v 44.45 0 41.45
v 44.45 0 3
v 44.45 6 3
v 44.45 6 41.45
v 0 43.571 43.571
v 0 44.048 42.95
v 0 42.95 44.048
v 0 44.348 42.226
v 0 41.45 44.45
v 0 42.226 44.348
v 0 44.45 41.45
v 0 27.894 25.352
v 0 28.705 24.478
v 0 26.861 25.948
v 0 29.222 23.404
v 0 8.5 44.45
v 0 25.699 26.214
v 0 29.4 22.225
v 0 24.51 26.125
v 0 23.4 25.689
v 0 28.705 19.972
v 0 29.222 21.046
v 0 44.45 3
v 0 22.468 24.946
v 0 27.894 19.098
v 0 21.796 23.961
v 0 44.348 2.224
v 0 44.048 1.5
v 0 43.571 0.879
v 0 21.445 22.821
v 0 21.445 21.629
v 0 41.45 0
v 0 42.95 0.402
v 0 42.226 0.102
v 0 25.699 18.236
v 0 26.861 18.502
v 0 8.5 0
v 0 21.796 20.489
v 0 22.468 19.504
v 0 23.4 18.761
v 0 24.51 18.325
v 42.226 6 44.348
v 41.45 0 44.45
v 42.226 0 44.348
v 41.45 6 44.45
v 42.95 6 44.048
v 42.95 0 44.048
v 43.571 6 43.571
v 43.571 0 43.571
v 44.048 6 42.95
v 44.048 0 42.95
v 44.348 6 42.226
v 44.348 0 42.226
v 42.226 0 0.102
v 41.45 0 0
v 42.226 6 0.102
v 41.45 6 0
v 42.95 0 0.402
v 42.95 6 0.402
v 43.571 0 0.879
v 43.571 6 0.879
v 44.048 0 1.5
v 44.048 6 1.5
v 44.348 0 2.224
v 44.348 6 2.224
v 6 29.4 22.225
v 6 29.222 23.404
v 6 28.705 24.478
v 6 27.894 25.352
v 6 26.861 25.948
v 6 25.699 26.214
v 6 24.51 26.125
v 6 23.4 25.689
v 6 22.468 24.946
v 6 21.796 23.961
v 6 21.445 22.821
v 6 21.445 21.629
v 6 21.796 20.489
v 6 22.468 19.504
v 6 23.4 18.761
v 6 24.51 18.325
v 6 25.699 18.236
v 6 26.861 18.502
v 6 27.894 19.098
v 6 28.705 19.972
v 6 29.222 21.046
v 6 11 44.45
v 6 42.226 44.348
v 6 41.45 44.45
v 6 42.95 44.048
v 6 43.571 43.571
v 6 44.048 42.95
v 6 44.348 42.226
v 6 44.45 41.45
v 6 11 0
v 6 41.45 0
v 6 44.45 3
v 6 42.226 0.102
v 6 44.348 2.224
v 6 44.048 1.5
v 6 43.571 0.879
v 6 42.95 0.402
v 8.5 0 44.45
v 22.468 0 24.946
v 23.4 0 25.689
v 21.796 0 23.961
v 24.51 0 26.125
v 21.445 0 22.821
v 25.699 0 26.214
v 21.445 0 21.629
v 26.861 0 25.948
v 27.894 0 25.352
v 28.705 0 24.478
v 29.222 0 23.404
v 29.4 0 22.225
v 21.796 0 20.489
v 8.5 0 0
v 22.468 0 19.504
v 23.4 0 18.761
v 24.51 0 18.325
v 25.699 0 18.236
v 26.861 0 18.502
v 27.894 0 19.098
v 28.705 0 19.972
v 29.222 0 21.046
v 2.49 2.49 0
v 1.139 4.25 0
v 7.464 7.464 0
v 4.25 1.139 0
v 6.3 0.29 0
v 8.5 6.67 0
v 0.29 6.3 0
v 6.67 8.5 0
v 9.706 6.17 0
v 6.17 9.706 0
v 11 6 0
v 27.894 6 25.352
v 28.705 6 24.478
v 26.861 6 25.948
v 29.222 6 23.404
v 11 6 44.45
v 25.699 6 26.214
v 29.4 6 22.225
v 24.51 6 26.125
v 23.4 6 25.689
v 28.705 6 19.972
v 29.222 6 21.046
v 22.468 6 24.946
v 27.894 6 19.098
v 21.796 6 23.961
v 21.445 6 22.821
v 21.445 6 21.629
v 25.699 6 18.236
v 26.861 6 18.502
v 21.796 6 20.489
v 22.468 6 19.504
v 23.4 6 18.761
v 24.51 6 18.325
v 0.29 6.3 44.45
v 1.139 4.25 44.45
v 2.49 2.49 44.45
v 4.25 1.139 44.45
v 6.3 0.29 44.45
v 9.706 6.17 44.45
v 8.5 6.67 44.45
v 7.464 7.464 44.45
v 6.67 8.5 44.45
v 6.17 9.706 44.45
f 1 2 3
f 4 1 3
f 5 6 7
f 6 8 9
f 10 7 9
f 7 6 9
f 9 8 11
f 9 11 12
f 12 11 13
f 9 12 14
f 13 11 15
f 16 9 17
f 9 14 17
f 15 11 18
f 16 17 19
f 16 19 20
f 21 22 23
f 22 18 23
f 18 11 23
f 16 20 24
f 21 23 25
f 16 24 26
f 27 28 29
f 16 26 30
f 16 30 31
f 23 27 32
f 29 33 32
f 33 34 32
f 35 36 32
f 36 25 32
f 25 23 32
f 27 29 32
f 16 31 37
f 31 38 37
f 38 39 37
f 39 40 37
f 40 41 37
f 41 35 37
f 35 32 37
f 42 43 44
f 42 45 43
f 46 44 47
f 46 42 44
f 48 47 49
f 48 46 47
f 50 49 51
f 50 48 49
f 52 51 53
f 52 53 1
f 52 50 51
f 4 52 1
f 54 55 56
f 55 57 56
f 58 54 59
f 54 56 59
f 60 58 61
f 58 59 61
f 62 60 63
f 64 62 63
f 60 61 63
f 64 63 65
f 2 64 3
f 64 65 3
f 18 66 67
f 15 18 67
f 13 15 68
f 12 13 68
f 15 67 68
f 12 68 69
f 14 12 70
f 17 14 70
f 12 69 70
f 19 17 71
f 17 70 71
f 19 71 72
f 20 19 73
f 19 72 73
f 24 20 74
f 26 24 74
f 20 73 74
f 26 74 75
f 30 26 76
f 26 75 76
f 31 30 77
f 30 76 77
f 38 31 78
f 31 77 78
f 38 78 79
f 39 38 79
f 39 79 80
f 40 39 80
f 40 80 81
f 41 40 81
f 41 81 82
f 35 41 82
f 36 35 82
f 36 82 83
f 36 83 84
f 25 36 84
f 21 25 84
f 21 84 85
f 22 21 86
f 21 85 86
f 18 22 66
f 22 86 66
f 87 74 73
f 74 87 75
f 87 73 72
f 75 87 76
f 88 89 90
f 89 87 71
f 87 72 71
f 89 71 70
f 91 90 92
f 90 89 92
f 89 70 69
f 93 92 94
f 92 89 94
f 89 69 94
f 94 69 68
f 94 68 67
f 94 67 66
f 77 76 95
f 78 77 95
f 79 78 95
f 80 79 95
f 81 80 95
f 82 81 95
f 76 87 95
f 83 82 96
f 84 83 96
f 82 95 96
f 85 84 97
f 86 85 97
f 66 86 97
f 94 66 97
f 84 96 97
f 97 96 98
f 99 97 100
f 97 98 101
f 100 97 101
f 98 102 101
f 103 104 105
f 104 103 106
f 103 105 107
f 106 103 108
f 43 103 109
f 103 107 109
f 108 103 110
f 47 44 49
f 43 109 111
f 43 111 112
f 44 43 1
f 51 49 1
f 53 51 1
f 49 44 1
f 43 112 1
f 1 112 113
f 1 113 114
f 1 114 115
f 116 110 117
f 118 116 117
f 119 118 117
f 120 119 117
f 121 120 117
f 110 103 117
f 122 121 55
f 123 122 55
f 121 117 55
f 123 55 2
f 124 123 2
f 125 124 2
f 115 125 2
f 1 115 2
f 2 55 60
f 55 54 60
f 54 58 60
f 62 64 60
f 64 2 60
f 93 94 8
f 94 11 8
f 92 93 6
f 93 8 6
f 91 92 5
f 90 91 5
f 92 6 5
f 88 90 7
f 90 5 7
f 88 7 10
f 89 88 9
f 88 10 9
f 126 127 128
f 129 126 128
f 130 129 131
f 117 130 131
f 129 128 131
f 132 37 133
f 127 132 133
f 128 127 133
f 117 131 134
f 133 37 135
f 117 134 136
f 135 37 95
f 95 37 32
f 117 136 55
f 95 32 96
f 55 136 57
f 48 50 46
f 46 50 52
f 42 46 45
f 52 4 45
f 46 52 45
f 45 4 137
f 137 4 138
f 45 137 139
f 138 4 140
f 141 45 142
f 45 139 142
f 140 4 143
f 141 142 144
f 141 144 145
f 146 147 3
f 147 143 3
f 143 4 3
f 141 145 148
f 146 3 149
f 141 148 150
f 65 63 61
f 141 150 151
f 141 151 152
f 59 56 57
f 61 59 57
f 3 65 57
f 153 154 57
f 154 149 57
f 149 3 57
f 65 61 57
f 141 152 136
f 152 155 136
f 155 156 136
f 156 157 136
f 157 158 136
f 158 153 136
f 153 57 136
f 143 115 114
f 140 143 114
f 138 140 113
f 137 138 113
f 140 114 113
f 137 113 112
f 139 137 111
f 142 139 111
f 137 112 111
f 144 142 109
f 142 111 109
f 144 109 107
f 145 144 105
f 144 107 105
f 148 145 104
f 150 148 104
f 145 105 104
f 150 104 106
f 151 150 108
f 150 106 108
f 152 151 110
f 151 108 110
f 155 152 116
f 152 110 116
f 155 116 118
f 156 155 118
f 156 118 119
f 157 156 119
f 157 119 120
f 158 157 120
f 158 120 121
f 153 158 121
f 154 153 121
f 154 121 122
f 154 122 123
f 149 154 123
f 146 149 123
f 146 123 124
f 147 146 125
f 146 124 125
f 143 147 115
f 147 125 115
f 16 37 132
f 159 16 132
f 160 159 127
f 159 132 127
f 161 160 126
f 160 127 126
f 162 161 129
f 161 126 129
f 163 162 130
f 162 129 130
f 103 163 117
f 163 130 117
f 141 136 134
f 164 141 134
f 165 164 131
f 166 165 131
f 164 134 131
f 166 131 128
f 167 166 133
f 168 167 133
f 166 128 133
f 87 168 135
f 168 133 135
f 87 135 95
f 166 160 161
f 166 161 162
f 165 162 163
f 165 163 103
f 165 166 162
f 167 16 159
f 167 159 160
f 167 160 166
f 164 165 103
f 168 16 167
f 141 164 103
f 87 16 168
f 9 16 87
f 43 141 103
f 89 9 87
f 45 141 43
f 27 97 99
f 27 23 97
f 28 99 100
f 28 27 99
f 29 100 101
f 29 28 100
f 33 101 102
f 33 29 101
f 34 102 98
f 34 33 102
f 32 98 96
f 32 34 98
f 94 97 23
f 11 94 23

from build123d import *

# Parameters (mm, degrees)
F1_DEPTH = 44.45
F2_R     = 4
F3_DEPTH = 6
F4_R     = 4
F5_DEPTH = 6
F6_R     = 3


with BuildPart() as f1:
    # F0 (on Top) → F1 (new body)
    with BuildSketch(Plane.XY):
        with BuildLine():
            Line((6, 44.45), (0, 44.45))
            Line((0, 44.45), (0, 8.5))
            ThreePointArc((0, 8.5), (2.489592, 2.489592), (8.5, 0))
            Line((8.5, 0), (44.45, 0))
            Line((44.45, 0), (44.45, 6))
            Line((44.45, 6), (11, 6))
            ThreePointArc((11, 6), (7.464466, 7.464466), (6, 11))
            Line((6, 11), (6, 44.45))
        make_face()
    extrude(amount=F1_DEPTH)

    # F2 (on face) → F3 (cut, through all)
    with BuildSketch(Plane.YZ.offset(6)):
        with Locations((25.4, 22.225)):
            Circle(F2_R)
    extrude(amount=-F3_DEPTH, mode=Mode.SUBTRACT)

    # F4 (on face) → F5 (cut, through all)
    with BuildSketch(Plane.XZ):
        with Locations((25.4, 22.225)):
            Circle(F4_R)
    extrude(amount=-F5_DEPTH, mode=Mode.SUBTRACT)

    # F6
    f6_edges = [f1.edges().sort_by_distance(p)[0] for p in [
        (44.45, 3, 44.45),
        (44.45, 3, 0),
        (3, 44.45, 0),
        (3, 44.45, 44.45),
    ]]
    fillet(f6_edges, radius=F6_R)


solid = f1.part
